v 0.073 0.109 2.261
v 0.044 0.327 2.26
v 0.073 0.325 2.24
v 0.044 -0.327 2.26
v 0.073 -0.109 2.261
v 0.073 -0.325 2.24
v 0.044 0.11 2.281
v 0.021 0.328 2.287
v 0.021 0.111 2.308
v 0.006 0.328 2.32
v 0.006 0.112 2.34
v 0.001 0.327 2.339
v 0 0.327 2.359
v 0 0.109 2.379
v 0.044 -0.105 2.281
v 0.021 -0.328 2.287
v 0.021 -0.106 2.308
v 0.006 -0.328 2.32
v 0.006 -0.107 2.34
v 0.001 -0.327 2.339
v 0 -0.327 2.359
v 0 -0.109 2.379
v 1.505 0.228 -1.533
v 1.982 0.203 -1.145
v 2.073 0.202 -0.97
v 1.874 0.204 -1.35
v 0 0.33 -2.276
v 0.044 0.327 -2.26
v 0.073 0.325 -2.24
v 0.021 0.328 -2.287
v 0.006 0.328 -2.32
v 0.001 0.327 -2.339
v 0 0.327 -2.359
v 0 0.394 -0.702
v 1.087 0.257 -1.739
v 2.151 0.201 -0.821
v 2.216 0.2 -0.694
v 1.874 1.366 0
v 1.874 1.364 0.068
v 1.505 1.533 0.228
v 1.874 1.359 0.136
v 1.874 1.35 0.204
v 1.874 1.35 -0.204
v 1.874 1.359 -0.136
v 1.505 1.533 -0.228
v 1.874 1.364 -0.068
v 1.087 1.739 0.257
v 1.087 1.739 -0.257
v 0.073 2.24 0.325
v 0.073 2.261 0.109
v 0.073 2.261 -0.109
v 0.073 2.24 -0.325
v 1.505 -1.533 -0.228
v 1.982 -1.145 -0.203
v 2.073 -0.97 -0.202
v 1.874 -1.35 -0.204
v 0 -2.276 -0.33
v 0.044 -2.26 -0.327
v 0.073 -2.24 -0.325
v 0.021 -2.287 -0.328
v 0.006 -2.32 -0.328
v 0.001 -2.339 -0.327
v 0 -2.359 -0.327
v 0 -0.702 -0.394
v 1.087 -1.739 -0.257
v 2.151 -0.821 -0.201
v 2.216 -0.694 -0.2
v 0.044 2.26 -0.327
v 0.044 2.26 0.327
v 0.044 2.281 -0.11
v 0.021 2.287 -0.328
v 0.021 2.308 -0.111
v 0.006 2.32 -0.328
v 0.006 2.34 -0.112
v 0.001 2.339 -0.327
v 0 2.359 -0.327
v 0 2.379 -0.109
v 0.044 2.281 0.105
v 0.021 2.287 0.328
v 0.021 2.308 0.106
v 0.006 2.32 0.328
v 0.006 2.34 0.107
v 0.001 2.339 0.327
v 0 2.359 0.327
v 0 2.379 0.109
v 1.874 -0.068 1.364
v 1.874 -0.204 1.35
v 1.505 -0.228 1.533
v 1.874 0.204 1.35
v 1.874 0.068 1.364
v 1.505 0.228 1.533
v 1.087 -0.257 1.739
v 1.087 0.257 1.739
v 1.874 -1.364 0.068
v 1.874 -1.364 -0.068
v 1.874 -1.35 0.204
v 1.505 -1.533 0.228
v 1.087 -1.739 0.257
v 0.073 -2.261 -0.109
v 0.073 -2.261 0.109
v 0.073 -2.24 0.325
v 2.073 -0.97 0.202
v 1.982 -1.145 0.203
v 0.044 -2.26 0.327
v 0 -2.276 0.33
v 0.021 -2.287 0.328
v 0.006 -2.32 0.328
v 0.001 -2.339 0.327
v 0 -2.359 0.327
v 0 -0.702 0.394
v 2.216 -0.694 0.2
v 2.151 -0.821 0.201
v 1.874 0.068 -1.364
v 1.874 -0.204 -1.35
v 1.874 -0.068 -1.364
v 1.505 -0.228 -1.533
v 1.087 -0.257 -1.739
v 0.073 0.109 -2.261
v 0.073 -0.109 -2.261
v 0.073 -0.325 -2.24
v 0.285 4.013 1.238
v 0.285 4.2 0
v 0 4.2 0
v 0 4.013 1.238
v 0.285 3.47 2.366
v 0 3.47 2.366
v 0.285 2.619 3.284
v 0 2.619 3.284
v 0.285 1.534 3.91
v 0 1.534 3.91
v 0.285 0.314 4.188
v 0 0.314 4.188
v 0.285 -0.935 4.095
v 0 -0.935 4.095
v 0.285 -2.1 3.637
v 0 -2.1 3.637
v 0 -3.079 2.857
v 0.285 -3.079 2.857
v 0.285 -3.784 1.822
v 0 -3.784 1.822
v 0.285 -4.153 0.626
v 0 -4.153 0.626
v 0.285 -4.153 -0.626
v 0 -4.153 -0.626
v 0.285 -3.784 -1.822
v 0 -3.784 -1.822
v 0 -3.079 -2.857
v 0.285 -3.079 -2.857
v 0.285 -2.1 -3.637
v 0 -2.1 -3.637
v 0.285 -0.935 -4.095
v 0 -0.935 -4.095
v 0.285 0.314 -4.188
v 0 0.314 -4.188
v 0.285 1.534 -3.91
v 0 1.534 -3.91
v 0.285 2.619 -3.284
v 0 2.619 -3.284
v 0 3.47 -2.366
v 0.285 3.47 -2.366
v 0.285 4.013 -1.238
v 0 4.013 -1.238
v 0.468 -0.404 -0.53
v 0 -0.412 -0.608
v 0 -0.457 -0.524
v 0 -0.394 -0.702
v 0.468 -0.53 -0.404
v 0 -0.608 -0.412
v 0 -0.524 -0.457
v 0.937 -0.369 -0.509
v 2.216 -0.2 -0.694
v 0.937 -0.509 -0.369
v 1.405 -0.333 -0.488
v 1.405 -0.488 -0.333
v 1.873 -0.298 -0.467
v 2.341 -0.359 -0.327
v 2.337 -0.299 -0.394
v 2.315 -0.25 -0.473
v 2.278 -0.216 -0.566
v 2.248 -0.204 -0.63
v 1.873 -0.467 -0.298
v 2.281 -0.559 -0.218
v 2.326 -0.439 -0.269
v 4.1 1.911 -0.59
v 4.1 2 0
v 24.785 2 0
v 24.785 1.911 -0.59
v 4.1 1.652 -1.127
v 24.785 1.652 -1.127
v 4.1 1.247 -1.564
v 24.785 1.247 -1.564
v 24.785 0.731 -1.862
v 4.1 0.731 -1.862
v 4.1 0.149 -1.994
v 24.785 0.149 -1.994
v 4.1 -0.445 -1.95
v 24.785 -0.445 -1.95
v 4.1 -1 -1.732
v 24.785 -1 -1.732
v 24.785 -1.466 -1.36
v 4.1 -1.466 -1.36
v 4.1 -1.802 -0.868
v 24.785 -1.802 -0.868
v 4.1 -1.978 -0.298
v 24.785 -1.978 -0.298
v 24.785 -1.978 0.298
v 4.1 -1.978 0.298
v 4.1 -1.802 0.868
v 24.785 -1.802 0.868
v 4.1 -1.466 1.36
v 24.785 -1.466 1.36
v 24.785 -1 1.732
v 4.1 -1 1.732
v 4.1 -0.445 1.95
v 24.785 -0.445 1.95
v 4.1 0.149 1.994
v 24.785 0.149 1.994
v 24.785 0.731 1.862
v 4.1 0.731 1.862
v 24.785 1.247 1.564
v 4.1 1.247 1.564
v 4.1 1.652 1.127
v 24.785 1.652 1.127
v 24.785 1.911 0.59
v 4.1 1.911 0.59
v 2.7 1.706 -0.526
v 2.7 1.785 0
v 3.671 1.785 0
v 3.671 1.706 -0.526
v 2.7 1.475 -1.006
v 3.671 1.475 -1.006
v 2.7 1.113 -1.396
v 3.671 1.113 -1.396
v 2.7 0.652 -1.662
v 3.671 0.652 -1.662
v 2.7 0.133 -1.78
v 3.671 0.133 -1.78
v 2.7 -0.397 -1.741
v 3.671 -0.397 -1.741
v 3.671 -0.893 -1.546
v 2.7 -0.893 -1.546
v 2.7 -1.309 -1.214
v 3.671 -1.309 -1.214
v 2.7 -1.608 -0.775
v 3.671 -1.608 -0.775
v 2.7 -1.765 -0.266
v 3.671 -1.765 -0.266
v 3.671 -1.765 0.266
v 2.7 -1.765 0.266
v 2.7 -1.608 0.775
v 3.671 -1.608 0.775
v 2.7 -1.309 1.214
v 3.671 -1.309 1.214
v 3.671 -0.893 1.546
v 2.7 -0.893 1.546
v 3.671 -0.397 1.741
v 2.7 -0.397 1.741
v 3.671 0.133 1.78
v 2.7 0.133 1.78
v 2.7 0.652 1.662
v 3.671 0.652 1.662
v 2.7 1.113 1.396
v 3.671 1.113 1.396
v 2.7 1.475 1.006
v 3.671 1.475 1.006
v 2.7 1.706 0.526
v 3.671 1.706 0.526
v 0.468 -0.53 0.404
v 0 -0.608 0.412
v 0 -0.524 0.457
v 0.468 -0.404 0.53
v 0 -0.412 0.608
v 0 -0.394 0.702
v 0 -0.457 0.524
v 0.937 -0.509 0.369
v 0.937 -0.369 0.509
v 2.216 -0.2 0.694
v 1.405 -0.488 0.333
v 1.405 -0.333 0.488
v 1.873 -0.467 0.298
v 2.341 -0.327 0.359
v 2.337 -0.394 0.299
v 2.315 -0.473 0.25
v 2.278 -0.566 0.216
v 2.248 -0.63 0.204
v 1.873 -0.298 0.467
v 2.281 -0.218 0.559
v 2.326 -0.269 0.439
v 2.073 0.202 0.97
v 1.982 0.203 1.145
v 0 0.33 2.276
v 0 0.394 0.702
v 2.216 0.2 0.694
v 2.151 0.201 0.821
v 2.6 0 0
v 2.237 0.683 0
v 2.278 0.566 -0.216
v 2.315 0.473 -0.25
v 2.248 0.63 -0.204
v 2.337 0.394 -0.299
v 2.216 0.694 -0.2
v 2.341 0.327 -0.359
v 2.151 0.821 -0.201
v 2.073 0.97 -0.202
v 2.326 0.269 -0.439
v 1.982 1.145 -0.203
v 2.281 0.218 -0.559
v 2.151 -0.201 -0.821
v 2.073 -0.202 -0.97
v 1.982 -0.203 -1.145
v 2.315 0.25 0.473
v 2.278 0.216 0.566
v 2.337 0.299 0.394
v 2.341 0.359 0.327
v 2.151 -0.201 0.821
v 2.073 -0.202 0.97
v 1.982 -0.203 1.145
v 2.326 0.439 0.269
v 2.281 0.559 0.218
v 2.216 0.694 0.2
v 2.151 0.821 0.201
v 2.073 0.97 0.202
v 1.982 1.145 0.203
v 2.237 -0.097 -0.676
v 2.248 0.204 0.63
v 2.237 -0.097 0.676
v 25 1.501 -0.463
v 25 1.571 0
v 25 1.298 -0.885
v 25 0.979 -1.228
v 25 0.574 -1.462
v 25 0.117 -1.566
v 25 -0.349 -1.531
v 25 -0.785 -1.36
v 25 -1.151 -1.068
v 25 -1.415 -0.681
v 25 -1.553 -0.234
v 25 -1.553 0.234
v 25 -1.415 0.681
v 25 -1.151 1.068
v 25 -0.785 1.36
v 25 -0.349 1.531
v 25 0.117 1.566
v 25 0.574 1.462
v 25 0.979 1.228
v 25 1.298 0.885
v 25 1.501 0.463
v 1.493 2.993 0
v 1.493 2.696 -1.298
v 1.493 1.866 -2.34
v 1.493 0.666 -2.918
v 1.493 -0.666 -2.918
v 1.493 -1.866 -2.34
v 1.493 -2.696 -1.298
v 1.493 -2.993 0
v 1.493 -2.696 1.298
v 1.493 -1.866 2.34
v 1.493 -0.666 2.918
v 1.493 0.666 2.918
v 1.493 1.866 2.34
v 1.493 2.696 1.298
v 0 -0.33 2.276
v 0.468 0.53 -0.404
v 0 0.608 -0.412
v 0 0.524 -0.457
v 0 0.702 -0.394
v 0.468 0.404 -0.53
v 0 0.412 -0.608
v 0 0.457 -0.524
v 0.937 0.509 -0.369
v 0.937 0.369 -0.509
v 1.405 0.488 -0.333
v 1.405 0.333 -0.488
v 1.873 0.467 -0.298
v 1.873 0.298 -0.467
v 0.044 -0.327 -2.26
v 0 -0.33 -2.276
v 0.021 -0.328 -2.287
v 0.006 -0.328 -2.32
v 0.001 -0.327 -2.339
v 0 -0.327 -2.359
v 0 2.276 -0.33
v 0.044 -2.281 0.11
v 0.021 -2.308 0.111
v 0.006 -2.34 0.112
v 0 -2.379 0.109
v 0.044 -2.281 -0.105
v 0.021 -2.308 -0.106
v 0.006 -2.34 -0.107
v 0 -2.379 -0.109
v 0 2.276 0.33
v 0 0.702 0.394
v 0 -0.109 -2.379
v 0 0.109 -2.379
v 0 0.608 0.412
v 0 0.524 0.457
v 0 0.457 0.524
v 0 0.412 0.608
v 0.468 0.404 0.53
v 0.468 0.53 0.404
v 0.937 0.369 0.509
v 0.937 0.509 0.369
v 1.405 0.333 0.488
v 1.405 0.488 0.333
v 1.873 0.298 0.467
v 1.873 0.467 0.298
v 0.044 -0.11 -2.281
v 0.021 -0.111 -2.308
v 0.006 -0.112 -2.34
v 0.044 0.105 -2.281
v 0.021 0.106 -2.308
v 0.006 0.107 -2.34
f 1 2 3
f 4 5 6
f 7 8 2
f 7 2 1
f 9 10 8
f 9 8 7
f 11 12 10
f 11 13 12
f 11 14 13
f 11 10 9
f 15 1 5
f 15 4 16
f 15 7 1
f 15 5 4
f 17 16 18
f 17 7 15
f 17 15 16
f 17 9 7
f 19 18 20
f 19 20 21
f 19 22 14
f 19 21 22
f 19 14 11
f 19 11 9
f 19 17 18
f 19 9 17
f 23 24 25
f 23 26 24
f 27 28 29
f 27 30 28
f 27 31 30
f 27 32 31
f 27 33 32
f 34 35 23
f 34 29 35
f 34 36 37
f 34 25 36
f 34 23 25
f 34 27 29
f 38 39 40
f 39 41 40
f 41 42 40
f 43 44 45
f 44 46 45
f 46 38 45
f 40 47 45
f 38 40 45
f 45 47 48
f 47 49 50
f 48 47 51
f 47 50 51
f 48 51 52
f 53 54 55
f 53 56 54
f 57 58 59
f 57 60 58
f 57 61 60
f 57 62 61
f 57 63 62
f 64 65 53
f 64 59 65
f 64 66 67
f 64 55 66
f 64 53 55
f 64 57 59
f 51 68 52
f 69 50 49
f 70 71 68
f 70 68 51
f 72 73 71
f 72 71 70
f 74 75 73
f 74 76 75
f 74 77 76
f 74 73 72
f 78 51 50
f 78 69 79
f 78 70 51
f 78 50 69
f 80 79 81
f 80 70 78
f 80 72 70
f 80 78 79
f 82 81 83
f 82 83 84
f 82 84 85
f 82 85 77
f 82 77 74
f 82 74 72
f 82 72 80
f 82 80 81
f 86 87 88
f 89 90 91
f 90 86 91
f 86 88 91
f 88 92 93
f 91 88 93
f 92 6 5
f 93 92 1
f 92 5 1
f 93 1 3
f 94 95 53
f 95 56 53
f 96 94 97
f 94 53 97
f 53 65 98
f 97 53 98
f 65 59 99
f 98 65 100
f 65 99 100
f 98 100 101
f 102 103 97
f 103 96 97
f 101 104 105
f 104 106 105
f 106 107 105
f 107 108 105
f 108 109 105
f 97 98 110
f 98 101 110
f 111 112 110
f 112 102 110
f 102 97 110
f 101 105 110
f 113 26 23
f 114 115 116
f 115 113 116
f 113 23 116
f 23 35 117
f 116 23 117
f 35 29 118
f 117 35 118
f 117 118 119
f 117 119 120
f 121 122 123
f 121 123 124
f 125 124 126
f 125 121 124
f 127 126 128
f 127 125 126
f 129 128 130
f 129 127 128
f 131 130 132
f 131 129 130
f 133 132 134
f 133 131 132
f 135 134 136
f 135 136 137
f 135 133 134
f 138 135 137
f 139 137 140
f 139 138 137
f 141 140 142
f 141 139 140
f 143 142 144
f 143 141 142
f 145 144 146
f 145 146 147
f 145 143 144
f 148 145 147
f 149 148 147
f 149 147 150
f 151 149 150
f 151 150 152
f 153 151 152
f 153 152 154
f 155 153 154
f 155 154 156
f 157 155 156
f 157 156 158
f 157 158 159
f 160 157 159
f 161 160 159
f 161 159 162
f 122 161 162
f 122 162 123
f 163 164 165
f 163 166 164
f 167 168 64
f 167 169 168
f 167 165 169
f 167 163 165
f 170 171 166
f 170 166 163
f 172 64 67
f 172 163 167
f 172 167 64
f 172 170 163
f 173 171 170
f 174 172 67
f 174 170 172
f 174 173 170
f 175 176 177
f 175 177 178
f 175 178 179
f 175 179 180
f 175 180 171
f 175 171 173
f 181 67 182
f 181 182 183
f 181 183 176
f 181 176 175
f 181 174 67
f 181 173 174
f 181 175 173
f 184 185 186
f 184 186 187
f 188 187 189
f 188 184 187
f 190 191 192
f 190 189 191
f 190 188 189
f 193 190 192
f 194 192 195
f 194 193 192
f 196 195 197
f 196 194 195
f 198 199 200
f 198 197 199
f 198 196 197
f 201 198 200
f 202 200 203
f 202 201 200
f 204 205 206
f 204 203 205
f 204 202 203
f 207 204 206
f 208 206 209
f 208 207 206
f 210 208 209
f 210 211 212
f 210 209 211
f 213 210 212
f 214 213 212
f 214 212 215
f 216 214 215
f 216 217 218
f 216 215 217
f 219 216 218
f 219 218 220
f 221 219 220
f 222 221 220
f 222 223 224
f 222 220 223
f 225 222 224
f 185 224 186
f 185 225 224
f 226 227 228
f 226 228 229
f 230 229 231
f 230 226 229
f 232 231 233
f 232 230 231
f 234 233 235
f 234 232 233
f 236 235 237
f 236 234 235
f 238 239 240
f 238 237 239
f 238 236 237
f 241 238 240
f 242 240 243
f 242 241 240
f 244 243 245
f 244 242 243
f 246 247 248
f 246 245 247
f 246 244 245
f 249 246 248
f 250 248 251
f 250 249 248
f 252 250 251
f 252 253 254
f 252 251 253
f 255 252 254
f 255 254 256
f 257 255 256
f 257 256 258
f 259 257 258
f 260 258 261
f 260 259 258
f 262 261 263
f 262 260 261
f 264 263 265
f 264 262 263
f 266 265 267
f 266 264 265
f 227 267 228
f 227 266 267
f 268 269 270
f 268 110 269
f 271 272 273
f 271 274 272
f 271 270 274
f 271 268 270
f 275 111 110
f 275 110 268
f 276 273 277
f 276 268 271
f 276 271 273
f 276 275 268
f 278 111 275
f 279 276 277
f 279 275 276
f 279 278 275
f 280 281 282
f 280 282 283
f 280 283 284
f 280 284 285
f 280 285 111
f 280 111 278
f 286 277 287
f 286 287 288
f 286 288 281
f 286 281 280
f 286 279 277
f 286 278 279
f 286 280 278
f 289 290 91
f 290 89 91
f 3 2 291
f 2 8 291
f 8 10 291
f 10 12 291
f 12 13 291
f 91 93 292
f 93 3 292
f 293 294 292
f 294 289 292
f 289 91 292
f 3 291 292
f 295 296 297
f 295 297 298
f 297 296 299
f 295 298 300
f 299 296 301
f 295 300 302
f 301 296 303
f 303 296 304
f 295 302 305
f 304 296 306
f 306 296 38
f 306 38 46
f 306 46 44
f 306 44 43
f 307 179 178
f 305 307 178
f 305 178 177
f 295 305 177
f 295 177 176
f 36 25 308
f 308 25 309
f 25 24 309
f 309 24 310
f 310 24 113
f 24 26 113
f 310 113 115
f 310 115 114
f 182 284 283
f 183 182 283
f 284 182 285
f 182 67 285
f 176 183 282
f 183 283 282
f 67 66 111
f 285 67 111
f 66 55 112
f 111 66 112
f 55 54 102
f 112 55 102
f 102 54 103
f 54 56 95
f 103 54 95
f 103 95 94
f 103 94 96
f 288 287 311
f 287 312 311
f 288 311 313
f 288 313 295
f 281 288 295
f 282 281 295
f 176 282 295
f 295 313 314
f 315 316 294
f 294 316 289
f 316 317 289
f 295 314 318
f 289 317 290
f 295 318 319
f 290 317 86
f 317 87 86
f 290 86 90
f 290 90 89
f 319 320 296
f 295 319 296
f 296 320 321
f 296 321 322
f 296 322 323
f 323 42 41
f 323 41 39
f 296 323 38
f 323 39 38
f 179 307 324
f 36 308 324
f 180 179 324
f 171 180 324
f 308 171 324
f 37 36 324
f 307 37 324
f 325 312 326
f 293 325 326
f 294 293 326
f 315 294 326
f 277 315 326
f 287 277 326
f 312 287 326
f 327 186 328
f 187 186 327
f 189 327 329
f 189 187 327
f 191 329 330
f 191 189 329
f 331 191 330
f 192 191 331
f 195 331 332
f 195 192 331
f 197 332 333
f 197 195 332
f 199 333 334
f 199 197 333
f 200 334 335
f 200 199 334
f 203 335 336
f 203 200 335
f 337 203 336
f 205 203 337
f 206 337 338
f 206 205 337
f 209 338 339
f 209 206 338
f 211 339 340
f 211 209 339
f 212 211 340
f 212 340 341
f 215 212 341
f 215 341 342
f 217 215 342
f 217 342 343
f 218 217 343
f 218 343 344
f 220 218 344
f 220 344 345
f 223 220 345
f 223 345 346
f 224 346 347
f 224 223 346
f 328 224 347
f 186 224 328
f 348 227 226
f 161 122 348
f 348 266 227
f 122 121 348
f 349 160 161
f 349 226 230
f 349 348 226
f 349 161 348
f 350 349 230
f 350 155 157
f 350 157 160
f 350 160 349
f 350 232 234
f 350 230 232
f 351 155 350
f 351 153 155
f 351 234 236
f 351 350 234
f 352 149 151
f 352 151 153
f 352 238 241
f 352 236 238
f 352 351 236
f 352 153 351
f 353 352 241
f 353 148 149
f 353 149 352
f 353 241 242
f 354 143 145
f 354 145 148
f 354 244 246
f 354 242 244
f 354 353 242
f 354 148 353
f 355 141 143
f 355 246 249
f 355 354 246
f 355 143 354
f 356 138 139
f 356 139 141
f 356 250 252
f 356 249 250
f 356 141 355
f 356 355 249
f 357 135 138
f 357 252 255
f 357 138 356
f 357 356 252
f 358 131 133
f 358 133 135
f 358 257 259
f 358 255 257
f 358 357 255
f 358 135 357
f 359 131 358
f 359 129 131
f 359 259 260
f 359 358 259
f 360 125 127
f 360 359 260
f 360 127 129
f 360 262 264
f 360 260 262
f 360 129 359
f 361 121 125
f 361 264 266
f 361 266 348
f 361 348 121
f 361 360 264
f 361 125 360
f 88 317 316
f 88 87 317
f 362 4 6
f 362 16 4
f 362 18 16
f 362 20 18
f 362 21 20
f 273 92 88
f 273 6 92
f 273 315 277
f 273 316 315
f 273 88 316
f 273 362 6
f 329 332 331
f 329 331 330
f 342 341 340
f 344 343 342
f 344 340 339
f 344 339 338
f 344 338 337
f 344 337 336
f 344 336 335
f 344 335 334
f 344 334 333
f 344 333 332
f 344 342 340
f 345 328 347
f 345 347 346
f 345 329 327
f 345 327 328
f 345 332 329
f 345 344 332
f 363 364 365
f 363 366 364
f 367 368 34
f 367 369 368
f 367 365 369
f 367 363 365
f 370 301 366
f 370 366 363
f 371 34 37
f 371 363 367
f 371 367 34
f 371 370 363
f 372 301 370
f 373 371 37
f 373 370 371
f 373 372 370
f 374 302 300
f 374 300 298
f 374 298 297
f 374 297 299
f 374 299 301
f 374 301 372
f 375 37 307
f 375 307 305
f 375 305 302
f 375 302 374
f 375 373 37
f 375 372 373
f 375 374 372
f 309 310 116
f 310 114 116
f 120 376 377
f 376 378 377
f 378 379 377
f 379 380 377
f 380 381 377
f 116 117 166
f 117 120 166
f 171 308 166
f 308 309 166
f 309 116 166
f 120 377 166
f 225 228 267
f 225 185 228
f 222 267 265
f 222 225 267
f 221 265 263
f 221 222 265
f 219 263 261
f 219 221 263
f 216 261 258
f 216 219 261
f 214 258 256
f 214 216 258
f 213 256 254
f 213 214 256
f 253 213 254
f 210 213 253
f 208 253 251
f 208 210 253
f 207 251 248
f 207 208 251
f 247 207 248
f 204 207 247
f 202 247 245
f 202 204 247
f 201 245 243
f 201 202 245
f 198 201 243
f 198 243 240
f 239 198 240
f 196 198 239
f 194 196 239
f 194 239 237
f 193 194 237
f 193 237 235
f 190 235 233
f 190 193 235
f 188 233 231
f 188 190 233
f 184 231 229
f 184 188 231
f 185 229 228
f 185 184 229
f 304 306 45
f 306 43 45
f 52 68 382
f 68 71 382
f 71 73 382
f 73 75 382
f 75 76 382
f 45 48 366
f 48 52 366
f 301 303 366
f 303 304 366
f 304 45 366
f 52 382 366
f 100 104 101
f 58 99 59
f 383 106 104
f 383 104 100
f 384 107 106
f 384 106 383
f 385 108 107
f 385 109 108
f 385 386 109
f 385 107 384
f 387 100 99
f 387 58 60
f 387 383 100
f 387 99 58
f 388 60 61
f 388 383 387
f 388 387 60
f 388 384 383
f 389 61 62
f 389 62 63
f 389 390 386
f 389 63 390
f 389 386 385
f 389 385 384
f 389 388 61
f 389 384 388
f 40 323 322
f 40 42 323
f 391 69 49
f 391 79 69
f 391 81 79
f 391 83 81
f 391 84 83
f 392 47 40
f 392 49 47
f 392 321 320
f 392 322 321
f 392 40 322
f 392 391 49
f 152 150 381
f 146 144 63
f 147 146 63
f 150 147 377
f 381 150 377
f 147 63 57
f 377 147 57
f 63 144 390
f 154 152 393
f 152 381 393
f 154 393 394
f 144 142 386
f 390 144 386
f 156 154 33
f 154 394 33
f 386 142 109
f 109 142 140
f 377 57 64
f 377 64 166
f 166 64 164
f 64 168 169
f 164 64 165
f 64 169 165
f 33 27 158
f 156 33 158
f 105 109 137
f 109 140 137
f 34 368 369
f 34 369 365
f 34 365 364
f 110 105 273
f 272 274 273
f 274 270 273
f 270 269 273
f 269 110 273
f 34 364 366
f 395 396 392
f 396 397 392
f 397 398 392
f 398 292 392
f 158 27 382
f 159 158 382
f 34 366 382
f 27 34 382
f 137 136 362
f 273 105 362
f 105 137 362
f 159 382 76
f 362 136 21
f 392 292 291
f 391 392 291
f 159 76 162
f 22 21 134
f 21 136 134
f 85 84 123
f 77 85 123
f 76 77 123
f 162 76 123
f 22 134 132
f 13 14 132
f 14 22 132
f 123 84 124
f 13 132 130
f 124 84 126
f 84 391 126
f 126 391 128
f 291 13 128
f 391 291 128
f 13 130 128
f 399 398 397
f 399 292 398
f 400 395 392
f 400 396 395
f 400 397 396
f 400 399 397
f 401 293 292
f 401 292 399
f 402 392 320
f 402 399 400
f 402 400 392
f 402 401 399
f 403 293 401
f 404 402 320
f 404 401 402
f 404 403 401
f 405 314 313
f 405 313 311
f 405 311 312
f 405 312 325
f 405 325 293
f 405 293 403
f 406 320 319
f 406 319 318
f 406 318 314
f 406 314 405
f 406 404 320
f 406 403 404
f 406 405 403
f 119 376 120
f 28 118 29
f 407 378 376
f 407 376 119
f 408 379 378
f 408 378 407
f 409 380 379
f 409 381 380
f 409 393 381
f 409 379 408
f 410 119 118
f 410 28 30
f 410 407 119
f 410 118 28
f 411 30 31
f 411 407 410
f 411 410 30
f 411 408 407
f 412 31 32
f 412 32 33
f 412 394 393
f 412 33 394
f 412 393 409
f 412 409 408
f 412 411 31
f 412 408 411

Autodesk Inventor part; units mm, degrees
ref_plane "YZ Plane" through (0, 0, 0) normal (1, 0, 0) x (0, 1, 0)
ref_plane "XZ Plane" through (0, 0, 0) normal (0, 1, 0) x (-1, 0, 0)
sketch "Sketch1" plane through (0, 0, 0) normal (0, 0, 1) x (1, 0, 0)
  line L0 (2.6, 0) -> (25, 0)
  line L1 (25, 0) -> (25, 2)
  line L2 (25, 2) -> (4.1, 2)
  line L3 (4.1, 2) -> (3.6706, 1.7853)
  line L4 (3.6706, 1.7853) -> (2.7, 1.7853)
  line L5 (0, 4.2) -> (0, 2.3)
  line L6 (0, 2.3) -> (1.8738, 1.3657)
  line L7 (1.8738, 1.3657) -> (2.6, 0)
  line L8 (-5, 0) -> (30, 0) projected
  line L9 (0, -0.84) -> (0, 5.04) projected
  line L10 (0, 4.2) -> (0.2853, 4.2)
  line L11 (0.2853, 4.2) -> (2.7, 1.7853)
  line L12 (4.1, 2) -> (2.4853, 2) construction
  dimension "d1" = 20.9
  dimension "d2" = 4
  dimension "d3" = 3.5706
  dimension "d4" = 4.6
  dimension "d5" = 26.5
  dimension "d6" = 62
  dimension "d7" = 2.6
  dimension "d8" = 0.4294
  dimension "d12" = 8.4
  dimension "d13" = 45
  dimension "d15" = 25
  dimension "d24" = 2.7
revolve "Body" add sketch "Sketch1" angle 360 about axis through (2.6, 0, 0) along (1, 0, 0) contours L7 L6 L5 L10 L11 L4 L3 L2 L1 L0
sketch "Sketch2" plane through (0, 0, 0) normal (-1, 0, 0) x (0, 0, 1)
  line L0 (0, 2.3) -> (0, 0) construction
  line L1 (0, 0) -> (2.3, 0) construction
  arc A0 (0.69, 0) -> (0, 0.69) centre (0, 0) ccw construction
  arc A1 (0.805, 0) -> (0, 0.805) centre (0, 0) ccw construction
  arc A2 (2.2762, 0.33) -> (0.33, 2.2762) centre (0, 0) ccw
  line L2 (0, 0) -> (1.6263, 1.6263) construction
  line L3 (0.33, 2.2762) -> (0.3941, 0.7019)
  line L4 (2.2762, 0.33) -> (0.7019, 0.3941)
  arc A3 (0.33, 2.2762) -> (0, 2.3) centre (0, 0) ccw
  arc A4 (2.3, 0) -> (2.2762, 0.33) centre (0, 0) ccw
  line L5 (0, -5.88) -> (0, 5.88) projected
  line L6 (-5.88, 0) -> (5.88, 0) projected
  arc A5 (0.33, -2.2762) -> (2.2762, -0.33) centre (0, 0) ccw
  line L7 (0.33, -2.2762) -> (0.3941, -0.7019)
  line L8 (2.2762, -0.33) -> (0.7019, -0.3941)
  arc A6 (0, -2.3) -> (0.33, -2.2762) centre (0, 0) ccw
  arc A7 (2.2762, -0.33) -> (2.3, 0) centre (0, 0) ccw
  arc A8 (-0.33, 2.2762) -> (-2.2762, 0.33) centre (0, 0) ccw
  line L9 (-0.33, 2.2762) -> (-0.3941, 0.7019)
  line L10 (-2.2762, 0.33) -> (-0.7019, 0.3941)
  arc A9 (0, 2.3) -> (-0.33, 2.2762) centre (0, 0) ccw
  arc A10 (-2.2762, 0.33) -> (-2.3, 0) centre (0, 0) ccw
  arc A11 (-0.33, -2.2762) -> (0, -2.3) centre (0, 0) ccw
  arc A12 (-2.2762, -0.33) -> (-0.33, -2.2762) centre (0, 0) ccw
  arc A13 (-2.3, 0) -> (-2.2762, -0.33) centre (0, 0) ccw
  line L11 (-2.2762, -0.33) -> (-0.7019, -0.3941)
  line L12 (-0.33, -2.2762) -> (-0.3941, -0.7019)
  arc A14 (0.3941, 0.7019) -> (0.7019, 0.3941) centre (0.715, 0.715) ccw
  arc A15 (0.7019, -0.3941) -> (0.3941, -0.7019) centre (0.715, -0.715) ccw
  arc A16 (-0.7019, 0.3941) -> (-0.3941, 0.7019) centre (-0.715, 0.715) ccw
  arc A17 (-0.3941, -0.7019) -> (-0.7019, -0.3941) centre (-0.715, -0.715) ccw
  point P0 (1.6263, -1.6263)
  point P1 (-1.6263, 1.6263)
  point P2 (-1.6263, -1.6263)
  dimension "d17" = 1.38
  dimension "d18" = 1.61
  dimension "d19" = 4.6
  dimension "d20" = 45
  dimension "d21" = 0.33
extrude "Slot" add sketch "Sketch2" against normal up to next draft 5 contours L4 A14 L3 A2 | A5 L7 A15 L8 | L9 A16 L10 A8 | A12 L11 A17 L12
fillet "Fillet1" radius 0.132 4 edges at (0, 2.3, 0) (0, 0, -2.3) (0, -2.3, 0) (0, 0, 2.3)
thread "Thread" size "M4x0.7" class "6g" standard "ISO Metric profile" length 20.9
chamfer "Chamfer1" distance 0.4294 distance2 0.2147 1 edges at (25, -2, 0) measured on face at (25, -0.9099, 0.3408)
ref_plane "Work Plane2" through (3.35, 0, 0) normal (0, 0, -1) x (1, 0, 0)
equation "\"d1\" = GEL"
equation "\"d2\" = GD"
equation "\"d3\" = BDM"
equation "\"d4\" = SDM"
equation "\"d7\" = INTI"
equation "\"d8\" = GAL"
equation "\"d12\" = KOD"
equation "\"d13\" = 0.5 * SEWI"
equation "\"d15\" = NLG"
equation "\"d24\" = KOH"
equation "\"d17\" = 0.3 * SDM"
equation "\"d18\" = 0.35 * SDM"
equation "\"d19\" = SDM"
equation "\"d21\" = 0.5 * SBR"
equation "\"d23\" = 0.2 * SBR"
equation "\"d10\" = GEL"
equation "\"d25\" = -0.5 * SPD + 0.5 * GD"
equation "\"d26\" = 0.5 * GAL"
equation "\"NLG\" = 25"
equation "\"GEL\" = 20.9"
equation "\"GAL\" = 0.61345 * PTC"
equation "\"SPD\" = NND - 1.2269 * PTC"
equation "\"KOD\" = 8.4"
equation "\"KOH\" = 2.7"
equation "\"SBR\" = 0.66"
equation "\"INTI\" = 2.6"
equation "\"SDM\" = 4.6"
equation "\"GD\" = NND"
equation "\"BDM\" = NND - GAL"
equation "\"SEWI\" = 90deg"
equation "\"d9\" = SDM"
equation "\"GUL\" = 0.61345 * PTC"
equation "\"TOA\" = 30deg"
equation "\"EPV\" = 4.7"
equation "\"THREADDIA\" = 4"
equation "\"PTC\" = 0.7"
equation "\"NND\" = 4"
equation "\"GD1\" = THREADDIA - 1.2269 * PTC"
properties part number "ISO 7046-1 - M4 x 25 - 4.8 - H" material "Steel"
